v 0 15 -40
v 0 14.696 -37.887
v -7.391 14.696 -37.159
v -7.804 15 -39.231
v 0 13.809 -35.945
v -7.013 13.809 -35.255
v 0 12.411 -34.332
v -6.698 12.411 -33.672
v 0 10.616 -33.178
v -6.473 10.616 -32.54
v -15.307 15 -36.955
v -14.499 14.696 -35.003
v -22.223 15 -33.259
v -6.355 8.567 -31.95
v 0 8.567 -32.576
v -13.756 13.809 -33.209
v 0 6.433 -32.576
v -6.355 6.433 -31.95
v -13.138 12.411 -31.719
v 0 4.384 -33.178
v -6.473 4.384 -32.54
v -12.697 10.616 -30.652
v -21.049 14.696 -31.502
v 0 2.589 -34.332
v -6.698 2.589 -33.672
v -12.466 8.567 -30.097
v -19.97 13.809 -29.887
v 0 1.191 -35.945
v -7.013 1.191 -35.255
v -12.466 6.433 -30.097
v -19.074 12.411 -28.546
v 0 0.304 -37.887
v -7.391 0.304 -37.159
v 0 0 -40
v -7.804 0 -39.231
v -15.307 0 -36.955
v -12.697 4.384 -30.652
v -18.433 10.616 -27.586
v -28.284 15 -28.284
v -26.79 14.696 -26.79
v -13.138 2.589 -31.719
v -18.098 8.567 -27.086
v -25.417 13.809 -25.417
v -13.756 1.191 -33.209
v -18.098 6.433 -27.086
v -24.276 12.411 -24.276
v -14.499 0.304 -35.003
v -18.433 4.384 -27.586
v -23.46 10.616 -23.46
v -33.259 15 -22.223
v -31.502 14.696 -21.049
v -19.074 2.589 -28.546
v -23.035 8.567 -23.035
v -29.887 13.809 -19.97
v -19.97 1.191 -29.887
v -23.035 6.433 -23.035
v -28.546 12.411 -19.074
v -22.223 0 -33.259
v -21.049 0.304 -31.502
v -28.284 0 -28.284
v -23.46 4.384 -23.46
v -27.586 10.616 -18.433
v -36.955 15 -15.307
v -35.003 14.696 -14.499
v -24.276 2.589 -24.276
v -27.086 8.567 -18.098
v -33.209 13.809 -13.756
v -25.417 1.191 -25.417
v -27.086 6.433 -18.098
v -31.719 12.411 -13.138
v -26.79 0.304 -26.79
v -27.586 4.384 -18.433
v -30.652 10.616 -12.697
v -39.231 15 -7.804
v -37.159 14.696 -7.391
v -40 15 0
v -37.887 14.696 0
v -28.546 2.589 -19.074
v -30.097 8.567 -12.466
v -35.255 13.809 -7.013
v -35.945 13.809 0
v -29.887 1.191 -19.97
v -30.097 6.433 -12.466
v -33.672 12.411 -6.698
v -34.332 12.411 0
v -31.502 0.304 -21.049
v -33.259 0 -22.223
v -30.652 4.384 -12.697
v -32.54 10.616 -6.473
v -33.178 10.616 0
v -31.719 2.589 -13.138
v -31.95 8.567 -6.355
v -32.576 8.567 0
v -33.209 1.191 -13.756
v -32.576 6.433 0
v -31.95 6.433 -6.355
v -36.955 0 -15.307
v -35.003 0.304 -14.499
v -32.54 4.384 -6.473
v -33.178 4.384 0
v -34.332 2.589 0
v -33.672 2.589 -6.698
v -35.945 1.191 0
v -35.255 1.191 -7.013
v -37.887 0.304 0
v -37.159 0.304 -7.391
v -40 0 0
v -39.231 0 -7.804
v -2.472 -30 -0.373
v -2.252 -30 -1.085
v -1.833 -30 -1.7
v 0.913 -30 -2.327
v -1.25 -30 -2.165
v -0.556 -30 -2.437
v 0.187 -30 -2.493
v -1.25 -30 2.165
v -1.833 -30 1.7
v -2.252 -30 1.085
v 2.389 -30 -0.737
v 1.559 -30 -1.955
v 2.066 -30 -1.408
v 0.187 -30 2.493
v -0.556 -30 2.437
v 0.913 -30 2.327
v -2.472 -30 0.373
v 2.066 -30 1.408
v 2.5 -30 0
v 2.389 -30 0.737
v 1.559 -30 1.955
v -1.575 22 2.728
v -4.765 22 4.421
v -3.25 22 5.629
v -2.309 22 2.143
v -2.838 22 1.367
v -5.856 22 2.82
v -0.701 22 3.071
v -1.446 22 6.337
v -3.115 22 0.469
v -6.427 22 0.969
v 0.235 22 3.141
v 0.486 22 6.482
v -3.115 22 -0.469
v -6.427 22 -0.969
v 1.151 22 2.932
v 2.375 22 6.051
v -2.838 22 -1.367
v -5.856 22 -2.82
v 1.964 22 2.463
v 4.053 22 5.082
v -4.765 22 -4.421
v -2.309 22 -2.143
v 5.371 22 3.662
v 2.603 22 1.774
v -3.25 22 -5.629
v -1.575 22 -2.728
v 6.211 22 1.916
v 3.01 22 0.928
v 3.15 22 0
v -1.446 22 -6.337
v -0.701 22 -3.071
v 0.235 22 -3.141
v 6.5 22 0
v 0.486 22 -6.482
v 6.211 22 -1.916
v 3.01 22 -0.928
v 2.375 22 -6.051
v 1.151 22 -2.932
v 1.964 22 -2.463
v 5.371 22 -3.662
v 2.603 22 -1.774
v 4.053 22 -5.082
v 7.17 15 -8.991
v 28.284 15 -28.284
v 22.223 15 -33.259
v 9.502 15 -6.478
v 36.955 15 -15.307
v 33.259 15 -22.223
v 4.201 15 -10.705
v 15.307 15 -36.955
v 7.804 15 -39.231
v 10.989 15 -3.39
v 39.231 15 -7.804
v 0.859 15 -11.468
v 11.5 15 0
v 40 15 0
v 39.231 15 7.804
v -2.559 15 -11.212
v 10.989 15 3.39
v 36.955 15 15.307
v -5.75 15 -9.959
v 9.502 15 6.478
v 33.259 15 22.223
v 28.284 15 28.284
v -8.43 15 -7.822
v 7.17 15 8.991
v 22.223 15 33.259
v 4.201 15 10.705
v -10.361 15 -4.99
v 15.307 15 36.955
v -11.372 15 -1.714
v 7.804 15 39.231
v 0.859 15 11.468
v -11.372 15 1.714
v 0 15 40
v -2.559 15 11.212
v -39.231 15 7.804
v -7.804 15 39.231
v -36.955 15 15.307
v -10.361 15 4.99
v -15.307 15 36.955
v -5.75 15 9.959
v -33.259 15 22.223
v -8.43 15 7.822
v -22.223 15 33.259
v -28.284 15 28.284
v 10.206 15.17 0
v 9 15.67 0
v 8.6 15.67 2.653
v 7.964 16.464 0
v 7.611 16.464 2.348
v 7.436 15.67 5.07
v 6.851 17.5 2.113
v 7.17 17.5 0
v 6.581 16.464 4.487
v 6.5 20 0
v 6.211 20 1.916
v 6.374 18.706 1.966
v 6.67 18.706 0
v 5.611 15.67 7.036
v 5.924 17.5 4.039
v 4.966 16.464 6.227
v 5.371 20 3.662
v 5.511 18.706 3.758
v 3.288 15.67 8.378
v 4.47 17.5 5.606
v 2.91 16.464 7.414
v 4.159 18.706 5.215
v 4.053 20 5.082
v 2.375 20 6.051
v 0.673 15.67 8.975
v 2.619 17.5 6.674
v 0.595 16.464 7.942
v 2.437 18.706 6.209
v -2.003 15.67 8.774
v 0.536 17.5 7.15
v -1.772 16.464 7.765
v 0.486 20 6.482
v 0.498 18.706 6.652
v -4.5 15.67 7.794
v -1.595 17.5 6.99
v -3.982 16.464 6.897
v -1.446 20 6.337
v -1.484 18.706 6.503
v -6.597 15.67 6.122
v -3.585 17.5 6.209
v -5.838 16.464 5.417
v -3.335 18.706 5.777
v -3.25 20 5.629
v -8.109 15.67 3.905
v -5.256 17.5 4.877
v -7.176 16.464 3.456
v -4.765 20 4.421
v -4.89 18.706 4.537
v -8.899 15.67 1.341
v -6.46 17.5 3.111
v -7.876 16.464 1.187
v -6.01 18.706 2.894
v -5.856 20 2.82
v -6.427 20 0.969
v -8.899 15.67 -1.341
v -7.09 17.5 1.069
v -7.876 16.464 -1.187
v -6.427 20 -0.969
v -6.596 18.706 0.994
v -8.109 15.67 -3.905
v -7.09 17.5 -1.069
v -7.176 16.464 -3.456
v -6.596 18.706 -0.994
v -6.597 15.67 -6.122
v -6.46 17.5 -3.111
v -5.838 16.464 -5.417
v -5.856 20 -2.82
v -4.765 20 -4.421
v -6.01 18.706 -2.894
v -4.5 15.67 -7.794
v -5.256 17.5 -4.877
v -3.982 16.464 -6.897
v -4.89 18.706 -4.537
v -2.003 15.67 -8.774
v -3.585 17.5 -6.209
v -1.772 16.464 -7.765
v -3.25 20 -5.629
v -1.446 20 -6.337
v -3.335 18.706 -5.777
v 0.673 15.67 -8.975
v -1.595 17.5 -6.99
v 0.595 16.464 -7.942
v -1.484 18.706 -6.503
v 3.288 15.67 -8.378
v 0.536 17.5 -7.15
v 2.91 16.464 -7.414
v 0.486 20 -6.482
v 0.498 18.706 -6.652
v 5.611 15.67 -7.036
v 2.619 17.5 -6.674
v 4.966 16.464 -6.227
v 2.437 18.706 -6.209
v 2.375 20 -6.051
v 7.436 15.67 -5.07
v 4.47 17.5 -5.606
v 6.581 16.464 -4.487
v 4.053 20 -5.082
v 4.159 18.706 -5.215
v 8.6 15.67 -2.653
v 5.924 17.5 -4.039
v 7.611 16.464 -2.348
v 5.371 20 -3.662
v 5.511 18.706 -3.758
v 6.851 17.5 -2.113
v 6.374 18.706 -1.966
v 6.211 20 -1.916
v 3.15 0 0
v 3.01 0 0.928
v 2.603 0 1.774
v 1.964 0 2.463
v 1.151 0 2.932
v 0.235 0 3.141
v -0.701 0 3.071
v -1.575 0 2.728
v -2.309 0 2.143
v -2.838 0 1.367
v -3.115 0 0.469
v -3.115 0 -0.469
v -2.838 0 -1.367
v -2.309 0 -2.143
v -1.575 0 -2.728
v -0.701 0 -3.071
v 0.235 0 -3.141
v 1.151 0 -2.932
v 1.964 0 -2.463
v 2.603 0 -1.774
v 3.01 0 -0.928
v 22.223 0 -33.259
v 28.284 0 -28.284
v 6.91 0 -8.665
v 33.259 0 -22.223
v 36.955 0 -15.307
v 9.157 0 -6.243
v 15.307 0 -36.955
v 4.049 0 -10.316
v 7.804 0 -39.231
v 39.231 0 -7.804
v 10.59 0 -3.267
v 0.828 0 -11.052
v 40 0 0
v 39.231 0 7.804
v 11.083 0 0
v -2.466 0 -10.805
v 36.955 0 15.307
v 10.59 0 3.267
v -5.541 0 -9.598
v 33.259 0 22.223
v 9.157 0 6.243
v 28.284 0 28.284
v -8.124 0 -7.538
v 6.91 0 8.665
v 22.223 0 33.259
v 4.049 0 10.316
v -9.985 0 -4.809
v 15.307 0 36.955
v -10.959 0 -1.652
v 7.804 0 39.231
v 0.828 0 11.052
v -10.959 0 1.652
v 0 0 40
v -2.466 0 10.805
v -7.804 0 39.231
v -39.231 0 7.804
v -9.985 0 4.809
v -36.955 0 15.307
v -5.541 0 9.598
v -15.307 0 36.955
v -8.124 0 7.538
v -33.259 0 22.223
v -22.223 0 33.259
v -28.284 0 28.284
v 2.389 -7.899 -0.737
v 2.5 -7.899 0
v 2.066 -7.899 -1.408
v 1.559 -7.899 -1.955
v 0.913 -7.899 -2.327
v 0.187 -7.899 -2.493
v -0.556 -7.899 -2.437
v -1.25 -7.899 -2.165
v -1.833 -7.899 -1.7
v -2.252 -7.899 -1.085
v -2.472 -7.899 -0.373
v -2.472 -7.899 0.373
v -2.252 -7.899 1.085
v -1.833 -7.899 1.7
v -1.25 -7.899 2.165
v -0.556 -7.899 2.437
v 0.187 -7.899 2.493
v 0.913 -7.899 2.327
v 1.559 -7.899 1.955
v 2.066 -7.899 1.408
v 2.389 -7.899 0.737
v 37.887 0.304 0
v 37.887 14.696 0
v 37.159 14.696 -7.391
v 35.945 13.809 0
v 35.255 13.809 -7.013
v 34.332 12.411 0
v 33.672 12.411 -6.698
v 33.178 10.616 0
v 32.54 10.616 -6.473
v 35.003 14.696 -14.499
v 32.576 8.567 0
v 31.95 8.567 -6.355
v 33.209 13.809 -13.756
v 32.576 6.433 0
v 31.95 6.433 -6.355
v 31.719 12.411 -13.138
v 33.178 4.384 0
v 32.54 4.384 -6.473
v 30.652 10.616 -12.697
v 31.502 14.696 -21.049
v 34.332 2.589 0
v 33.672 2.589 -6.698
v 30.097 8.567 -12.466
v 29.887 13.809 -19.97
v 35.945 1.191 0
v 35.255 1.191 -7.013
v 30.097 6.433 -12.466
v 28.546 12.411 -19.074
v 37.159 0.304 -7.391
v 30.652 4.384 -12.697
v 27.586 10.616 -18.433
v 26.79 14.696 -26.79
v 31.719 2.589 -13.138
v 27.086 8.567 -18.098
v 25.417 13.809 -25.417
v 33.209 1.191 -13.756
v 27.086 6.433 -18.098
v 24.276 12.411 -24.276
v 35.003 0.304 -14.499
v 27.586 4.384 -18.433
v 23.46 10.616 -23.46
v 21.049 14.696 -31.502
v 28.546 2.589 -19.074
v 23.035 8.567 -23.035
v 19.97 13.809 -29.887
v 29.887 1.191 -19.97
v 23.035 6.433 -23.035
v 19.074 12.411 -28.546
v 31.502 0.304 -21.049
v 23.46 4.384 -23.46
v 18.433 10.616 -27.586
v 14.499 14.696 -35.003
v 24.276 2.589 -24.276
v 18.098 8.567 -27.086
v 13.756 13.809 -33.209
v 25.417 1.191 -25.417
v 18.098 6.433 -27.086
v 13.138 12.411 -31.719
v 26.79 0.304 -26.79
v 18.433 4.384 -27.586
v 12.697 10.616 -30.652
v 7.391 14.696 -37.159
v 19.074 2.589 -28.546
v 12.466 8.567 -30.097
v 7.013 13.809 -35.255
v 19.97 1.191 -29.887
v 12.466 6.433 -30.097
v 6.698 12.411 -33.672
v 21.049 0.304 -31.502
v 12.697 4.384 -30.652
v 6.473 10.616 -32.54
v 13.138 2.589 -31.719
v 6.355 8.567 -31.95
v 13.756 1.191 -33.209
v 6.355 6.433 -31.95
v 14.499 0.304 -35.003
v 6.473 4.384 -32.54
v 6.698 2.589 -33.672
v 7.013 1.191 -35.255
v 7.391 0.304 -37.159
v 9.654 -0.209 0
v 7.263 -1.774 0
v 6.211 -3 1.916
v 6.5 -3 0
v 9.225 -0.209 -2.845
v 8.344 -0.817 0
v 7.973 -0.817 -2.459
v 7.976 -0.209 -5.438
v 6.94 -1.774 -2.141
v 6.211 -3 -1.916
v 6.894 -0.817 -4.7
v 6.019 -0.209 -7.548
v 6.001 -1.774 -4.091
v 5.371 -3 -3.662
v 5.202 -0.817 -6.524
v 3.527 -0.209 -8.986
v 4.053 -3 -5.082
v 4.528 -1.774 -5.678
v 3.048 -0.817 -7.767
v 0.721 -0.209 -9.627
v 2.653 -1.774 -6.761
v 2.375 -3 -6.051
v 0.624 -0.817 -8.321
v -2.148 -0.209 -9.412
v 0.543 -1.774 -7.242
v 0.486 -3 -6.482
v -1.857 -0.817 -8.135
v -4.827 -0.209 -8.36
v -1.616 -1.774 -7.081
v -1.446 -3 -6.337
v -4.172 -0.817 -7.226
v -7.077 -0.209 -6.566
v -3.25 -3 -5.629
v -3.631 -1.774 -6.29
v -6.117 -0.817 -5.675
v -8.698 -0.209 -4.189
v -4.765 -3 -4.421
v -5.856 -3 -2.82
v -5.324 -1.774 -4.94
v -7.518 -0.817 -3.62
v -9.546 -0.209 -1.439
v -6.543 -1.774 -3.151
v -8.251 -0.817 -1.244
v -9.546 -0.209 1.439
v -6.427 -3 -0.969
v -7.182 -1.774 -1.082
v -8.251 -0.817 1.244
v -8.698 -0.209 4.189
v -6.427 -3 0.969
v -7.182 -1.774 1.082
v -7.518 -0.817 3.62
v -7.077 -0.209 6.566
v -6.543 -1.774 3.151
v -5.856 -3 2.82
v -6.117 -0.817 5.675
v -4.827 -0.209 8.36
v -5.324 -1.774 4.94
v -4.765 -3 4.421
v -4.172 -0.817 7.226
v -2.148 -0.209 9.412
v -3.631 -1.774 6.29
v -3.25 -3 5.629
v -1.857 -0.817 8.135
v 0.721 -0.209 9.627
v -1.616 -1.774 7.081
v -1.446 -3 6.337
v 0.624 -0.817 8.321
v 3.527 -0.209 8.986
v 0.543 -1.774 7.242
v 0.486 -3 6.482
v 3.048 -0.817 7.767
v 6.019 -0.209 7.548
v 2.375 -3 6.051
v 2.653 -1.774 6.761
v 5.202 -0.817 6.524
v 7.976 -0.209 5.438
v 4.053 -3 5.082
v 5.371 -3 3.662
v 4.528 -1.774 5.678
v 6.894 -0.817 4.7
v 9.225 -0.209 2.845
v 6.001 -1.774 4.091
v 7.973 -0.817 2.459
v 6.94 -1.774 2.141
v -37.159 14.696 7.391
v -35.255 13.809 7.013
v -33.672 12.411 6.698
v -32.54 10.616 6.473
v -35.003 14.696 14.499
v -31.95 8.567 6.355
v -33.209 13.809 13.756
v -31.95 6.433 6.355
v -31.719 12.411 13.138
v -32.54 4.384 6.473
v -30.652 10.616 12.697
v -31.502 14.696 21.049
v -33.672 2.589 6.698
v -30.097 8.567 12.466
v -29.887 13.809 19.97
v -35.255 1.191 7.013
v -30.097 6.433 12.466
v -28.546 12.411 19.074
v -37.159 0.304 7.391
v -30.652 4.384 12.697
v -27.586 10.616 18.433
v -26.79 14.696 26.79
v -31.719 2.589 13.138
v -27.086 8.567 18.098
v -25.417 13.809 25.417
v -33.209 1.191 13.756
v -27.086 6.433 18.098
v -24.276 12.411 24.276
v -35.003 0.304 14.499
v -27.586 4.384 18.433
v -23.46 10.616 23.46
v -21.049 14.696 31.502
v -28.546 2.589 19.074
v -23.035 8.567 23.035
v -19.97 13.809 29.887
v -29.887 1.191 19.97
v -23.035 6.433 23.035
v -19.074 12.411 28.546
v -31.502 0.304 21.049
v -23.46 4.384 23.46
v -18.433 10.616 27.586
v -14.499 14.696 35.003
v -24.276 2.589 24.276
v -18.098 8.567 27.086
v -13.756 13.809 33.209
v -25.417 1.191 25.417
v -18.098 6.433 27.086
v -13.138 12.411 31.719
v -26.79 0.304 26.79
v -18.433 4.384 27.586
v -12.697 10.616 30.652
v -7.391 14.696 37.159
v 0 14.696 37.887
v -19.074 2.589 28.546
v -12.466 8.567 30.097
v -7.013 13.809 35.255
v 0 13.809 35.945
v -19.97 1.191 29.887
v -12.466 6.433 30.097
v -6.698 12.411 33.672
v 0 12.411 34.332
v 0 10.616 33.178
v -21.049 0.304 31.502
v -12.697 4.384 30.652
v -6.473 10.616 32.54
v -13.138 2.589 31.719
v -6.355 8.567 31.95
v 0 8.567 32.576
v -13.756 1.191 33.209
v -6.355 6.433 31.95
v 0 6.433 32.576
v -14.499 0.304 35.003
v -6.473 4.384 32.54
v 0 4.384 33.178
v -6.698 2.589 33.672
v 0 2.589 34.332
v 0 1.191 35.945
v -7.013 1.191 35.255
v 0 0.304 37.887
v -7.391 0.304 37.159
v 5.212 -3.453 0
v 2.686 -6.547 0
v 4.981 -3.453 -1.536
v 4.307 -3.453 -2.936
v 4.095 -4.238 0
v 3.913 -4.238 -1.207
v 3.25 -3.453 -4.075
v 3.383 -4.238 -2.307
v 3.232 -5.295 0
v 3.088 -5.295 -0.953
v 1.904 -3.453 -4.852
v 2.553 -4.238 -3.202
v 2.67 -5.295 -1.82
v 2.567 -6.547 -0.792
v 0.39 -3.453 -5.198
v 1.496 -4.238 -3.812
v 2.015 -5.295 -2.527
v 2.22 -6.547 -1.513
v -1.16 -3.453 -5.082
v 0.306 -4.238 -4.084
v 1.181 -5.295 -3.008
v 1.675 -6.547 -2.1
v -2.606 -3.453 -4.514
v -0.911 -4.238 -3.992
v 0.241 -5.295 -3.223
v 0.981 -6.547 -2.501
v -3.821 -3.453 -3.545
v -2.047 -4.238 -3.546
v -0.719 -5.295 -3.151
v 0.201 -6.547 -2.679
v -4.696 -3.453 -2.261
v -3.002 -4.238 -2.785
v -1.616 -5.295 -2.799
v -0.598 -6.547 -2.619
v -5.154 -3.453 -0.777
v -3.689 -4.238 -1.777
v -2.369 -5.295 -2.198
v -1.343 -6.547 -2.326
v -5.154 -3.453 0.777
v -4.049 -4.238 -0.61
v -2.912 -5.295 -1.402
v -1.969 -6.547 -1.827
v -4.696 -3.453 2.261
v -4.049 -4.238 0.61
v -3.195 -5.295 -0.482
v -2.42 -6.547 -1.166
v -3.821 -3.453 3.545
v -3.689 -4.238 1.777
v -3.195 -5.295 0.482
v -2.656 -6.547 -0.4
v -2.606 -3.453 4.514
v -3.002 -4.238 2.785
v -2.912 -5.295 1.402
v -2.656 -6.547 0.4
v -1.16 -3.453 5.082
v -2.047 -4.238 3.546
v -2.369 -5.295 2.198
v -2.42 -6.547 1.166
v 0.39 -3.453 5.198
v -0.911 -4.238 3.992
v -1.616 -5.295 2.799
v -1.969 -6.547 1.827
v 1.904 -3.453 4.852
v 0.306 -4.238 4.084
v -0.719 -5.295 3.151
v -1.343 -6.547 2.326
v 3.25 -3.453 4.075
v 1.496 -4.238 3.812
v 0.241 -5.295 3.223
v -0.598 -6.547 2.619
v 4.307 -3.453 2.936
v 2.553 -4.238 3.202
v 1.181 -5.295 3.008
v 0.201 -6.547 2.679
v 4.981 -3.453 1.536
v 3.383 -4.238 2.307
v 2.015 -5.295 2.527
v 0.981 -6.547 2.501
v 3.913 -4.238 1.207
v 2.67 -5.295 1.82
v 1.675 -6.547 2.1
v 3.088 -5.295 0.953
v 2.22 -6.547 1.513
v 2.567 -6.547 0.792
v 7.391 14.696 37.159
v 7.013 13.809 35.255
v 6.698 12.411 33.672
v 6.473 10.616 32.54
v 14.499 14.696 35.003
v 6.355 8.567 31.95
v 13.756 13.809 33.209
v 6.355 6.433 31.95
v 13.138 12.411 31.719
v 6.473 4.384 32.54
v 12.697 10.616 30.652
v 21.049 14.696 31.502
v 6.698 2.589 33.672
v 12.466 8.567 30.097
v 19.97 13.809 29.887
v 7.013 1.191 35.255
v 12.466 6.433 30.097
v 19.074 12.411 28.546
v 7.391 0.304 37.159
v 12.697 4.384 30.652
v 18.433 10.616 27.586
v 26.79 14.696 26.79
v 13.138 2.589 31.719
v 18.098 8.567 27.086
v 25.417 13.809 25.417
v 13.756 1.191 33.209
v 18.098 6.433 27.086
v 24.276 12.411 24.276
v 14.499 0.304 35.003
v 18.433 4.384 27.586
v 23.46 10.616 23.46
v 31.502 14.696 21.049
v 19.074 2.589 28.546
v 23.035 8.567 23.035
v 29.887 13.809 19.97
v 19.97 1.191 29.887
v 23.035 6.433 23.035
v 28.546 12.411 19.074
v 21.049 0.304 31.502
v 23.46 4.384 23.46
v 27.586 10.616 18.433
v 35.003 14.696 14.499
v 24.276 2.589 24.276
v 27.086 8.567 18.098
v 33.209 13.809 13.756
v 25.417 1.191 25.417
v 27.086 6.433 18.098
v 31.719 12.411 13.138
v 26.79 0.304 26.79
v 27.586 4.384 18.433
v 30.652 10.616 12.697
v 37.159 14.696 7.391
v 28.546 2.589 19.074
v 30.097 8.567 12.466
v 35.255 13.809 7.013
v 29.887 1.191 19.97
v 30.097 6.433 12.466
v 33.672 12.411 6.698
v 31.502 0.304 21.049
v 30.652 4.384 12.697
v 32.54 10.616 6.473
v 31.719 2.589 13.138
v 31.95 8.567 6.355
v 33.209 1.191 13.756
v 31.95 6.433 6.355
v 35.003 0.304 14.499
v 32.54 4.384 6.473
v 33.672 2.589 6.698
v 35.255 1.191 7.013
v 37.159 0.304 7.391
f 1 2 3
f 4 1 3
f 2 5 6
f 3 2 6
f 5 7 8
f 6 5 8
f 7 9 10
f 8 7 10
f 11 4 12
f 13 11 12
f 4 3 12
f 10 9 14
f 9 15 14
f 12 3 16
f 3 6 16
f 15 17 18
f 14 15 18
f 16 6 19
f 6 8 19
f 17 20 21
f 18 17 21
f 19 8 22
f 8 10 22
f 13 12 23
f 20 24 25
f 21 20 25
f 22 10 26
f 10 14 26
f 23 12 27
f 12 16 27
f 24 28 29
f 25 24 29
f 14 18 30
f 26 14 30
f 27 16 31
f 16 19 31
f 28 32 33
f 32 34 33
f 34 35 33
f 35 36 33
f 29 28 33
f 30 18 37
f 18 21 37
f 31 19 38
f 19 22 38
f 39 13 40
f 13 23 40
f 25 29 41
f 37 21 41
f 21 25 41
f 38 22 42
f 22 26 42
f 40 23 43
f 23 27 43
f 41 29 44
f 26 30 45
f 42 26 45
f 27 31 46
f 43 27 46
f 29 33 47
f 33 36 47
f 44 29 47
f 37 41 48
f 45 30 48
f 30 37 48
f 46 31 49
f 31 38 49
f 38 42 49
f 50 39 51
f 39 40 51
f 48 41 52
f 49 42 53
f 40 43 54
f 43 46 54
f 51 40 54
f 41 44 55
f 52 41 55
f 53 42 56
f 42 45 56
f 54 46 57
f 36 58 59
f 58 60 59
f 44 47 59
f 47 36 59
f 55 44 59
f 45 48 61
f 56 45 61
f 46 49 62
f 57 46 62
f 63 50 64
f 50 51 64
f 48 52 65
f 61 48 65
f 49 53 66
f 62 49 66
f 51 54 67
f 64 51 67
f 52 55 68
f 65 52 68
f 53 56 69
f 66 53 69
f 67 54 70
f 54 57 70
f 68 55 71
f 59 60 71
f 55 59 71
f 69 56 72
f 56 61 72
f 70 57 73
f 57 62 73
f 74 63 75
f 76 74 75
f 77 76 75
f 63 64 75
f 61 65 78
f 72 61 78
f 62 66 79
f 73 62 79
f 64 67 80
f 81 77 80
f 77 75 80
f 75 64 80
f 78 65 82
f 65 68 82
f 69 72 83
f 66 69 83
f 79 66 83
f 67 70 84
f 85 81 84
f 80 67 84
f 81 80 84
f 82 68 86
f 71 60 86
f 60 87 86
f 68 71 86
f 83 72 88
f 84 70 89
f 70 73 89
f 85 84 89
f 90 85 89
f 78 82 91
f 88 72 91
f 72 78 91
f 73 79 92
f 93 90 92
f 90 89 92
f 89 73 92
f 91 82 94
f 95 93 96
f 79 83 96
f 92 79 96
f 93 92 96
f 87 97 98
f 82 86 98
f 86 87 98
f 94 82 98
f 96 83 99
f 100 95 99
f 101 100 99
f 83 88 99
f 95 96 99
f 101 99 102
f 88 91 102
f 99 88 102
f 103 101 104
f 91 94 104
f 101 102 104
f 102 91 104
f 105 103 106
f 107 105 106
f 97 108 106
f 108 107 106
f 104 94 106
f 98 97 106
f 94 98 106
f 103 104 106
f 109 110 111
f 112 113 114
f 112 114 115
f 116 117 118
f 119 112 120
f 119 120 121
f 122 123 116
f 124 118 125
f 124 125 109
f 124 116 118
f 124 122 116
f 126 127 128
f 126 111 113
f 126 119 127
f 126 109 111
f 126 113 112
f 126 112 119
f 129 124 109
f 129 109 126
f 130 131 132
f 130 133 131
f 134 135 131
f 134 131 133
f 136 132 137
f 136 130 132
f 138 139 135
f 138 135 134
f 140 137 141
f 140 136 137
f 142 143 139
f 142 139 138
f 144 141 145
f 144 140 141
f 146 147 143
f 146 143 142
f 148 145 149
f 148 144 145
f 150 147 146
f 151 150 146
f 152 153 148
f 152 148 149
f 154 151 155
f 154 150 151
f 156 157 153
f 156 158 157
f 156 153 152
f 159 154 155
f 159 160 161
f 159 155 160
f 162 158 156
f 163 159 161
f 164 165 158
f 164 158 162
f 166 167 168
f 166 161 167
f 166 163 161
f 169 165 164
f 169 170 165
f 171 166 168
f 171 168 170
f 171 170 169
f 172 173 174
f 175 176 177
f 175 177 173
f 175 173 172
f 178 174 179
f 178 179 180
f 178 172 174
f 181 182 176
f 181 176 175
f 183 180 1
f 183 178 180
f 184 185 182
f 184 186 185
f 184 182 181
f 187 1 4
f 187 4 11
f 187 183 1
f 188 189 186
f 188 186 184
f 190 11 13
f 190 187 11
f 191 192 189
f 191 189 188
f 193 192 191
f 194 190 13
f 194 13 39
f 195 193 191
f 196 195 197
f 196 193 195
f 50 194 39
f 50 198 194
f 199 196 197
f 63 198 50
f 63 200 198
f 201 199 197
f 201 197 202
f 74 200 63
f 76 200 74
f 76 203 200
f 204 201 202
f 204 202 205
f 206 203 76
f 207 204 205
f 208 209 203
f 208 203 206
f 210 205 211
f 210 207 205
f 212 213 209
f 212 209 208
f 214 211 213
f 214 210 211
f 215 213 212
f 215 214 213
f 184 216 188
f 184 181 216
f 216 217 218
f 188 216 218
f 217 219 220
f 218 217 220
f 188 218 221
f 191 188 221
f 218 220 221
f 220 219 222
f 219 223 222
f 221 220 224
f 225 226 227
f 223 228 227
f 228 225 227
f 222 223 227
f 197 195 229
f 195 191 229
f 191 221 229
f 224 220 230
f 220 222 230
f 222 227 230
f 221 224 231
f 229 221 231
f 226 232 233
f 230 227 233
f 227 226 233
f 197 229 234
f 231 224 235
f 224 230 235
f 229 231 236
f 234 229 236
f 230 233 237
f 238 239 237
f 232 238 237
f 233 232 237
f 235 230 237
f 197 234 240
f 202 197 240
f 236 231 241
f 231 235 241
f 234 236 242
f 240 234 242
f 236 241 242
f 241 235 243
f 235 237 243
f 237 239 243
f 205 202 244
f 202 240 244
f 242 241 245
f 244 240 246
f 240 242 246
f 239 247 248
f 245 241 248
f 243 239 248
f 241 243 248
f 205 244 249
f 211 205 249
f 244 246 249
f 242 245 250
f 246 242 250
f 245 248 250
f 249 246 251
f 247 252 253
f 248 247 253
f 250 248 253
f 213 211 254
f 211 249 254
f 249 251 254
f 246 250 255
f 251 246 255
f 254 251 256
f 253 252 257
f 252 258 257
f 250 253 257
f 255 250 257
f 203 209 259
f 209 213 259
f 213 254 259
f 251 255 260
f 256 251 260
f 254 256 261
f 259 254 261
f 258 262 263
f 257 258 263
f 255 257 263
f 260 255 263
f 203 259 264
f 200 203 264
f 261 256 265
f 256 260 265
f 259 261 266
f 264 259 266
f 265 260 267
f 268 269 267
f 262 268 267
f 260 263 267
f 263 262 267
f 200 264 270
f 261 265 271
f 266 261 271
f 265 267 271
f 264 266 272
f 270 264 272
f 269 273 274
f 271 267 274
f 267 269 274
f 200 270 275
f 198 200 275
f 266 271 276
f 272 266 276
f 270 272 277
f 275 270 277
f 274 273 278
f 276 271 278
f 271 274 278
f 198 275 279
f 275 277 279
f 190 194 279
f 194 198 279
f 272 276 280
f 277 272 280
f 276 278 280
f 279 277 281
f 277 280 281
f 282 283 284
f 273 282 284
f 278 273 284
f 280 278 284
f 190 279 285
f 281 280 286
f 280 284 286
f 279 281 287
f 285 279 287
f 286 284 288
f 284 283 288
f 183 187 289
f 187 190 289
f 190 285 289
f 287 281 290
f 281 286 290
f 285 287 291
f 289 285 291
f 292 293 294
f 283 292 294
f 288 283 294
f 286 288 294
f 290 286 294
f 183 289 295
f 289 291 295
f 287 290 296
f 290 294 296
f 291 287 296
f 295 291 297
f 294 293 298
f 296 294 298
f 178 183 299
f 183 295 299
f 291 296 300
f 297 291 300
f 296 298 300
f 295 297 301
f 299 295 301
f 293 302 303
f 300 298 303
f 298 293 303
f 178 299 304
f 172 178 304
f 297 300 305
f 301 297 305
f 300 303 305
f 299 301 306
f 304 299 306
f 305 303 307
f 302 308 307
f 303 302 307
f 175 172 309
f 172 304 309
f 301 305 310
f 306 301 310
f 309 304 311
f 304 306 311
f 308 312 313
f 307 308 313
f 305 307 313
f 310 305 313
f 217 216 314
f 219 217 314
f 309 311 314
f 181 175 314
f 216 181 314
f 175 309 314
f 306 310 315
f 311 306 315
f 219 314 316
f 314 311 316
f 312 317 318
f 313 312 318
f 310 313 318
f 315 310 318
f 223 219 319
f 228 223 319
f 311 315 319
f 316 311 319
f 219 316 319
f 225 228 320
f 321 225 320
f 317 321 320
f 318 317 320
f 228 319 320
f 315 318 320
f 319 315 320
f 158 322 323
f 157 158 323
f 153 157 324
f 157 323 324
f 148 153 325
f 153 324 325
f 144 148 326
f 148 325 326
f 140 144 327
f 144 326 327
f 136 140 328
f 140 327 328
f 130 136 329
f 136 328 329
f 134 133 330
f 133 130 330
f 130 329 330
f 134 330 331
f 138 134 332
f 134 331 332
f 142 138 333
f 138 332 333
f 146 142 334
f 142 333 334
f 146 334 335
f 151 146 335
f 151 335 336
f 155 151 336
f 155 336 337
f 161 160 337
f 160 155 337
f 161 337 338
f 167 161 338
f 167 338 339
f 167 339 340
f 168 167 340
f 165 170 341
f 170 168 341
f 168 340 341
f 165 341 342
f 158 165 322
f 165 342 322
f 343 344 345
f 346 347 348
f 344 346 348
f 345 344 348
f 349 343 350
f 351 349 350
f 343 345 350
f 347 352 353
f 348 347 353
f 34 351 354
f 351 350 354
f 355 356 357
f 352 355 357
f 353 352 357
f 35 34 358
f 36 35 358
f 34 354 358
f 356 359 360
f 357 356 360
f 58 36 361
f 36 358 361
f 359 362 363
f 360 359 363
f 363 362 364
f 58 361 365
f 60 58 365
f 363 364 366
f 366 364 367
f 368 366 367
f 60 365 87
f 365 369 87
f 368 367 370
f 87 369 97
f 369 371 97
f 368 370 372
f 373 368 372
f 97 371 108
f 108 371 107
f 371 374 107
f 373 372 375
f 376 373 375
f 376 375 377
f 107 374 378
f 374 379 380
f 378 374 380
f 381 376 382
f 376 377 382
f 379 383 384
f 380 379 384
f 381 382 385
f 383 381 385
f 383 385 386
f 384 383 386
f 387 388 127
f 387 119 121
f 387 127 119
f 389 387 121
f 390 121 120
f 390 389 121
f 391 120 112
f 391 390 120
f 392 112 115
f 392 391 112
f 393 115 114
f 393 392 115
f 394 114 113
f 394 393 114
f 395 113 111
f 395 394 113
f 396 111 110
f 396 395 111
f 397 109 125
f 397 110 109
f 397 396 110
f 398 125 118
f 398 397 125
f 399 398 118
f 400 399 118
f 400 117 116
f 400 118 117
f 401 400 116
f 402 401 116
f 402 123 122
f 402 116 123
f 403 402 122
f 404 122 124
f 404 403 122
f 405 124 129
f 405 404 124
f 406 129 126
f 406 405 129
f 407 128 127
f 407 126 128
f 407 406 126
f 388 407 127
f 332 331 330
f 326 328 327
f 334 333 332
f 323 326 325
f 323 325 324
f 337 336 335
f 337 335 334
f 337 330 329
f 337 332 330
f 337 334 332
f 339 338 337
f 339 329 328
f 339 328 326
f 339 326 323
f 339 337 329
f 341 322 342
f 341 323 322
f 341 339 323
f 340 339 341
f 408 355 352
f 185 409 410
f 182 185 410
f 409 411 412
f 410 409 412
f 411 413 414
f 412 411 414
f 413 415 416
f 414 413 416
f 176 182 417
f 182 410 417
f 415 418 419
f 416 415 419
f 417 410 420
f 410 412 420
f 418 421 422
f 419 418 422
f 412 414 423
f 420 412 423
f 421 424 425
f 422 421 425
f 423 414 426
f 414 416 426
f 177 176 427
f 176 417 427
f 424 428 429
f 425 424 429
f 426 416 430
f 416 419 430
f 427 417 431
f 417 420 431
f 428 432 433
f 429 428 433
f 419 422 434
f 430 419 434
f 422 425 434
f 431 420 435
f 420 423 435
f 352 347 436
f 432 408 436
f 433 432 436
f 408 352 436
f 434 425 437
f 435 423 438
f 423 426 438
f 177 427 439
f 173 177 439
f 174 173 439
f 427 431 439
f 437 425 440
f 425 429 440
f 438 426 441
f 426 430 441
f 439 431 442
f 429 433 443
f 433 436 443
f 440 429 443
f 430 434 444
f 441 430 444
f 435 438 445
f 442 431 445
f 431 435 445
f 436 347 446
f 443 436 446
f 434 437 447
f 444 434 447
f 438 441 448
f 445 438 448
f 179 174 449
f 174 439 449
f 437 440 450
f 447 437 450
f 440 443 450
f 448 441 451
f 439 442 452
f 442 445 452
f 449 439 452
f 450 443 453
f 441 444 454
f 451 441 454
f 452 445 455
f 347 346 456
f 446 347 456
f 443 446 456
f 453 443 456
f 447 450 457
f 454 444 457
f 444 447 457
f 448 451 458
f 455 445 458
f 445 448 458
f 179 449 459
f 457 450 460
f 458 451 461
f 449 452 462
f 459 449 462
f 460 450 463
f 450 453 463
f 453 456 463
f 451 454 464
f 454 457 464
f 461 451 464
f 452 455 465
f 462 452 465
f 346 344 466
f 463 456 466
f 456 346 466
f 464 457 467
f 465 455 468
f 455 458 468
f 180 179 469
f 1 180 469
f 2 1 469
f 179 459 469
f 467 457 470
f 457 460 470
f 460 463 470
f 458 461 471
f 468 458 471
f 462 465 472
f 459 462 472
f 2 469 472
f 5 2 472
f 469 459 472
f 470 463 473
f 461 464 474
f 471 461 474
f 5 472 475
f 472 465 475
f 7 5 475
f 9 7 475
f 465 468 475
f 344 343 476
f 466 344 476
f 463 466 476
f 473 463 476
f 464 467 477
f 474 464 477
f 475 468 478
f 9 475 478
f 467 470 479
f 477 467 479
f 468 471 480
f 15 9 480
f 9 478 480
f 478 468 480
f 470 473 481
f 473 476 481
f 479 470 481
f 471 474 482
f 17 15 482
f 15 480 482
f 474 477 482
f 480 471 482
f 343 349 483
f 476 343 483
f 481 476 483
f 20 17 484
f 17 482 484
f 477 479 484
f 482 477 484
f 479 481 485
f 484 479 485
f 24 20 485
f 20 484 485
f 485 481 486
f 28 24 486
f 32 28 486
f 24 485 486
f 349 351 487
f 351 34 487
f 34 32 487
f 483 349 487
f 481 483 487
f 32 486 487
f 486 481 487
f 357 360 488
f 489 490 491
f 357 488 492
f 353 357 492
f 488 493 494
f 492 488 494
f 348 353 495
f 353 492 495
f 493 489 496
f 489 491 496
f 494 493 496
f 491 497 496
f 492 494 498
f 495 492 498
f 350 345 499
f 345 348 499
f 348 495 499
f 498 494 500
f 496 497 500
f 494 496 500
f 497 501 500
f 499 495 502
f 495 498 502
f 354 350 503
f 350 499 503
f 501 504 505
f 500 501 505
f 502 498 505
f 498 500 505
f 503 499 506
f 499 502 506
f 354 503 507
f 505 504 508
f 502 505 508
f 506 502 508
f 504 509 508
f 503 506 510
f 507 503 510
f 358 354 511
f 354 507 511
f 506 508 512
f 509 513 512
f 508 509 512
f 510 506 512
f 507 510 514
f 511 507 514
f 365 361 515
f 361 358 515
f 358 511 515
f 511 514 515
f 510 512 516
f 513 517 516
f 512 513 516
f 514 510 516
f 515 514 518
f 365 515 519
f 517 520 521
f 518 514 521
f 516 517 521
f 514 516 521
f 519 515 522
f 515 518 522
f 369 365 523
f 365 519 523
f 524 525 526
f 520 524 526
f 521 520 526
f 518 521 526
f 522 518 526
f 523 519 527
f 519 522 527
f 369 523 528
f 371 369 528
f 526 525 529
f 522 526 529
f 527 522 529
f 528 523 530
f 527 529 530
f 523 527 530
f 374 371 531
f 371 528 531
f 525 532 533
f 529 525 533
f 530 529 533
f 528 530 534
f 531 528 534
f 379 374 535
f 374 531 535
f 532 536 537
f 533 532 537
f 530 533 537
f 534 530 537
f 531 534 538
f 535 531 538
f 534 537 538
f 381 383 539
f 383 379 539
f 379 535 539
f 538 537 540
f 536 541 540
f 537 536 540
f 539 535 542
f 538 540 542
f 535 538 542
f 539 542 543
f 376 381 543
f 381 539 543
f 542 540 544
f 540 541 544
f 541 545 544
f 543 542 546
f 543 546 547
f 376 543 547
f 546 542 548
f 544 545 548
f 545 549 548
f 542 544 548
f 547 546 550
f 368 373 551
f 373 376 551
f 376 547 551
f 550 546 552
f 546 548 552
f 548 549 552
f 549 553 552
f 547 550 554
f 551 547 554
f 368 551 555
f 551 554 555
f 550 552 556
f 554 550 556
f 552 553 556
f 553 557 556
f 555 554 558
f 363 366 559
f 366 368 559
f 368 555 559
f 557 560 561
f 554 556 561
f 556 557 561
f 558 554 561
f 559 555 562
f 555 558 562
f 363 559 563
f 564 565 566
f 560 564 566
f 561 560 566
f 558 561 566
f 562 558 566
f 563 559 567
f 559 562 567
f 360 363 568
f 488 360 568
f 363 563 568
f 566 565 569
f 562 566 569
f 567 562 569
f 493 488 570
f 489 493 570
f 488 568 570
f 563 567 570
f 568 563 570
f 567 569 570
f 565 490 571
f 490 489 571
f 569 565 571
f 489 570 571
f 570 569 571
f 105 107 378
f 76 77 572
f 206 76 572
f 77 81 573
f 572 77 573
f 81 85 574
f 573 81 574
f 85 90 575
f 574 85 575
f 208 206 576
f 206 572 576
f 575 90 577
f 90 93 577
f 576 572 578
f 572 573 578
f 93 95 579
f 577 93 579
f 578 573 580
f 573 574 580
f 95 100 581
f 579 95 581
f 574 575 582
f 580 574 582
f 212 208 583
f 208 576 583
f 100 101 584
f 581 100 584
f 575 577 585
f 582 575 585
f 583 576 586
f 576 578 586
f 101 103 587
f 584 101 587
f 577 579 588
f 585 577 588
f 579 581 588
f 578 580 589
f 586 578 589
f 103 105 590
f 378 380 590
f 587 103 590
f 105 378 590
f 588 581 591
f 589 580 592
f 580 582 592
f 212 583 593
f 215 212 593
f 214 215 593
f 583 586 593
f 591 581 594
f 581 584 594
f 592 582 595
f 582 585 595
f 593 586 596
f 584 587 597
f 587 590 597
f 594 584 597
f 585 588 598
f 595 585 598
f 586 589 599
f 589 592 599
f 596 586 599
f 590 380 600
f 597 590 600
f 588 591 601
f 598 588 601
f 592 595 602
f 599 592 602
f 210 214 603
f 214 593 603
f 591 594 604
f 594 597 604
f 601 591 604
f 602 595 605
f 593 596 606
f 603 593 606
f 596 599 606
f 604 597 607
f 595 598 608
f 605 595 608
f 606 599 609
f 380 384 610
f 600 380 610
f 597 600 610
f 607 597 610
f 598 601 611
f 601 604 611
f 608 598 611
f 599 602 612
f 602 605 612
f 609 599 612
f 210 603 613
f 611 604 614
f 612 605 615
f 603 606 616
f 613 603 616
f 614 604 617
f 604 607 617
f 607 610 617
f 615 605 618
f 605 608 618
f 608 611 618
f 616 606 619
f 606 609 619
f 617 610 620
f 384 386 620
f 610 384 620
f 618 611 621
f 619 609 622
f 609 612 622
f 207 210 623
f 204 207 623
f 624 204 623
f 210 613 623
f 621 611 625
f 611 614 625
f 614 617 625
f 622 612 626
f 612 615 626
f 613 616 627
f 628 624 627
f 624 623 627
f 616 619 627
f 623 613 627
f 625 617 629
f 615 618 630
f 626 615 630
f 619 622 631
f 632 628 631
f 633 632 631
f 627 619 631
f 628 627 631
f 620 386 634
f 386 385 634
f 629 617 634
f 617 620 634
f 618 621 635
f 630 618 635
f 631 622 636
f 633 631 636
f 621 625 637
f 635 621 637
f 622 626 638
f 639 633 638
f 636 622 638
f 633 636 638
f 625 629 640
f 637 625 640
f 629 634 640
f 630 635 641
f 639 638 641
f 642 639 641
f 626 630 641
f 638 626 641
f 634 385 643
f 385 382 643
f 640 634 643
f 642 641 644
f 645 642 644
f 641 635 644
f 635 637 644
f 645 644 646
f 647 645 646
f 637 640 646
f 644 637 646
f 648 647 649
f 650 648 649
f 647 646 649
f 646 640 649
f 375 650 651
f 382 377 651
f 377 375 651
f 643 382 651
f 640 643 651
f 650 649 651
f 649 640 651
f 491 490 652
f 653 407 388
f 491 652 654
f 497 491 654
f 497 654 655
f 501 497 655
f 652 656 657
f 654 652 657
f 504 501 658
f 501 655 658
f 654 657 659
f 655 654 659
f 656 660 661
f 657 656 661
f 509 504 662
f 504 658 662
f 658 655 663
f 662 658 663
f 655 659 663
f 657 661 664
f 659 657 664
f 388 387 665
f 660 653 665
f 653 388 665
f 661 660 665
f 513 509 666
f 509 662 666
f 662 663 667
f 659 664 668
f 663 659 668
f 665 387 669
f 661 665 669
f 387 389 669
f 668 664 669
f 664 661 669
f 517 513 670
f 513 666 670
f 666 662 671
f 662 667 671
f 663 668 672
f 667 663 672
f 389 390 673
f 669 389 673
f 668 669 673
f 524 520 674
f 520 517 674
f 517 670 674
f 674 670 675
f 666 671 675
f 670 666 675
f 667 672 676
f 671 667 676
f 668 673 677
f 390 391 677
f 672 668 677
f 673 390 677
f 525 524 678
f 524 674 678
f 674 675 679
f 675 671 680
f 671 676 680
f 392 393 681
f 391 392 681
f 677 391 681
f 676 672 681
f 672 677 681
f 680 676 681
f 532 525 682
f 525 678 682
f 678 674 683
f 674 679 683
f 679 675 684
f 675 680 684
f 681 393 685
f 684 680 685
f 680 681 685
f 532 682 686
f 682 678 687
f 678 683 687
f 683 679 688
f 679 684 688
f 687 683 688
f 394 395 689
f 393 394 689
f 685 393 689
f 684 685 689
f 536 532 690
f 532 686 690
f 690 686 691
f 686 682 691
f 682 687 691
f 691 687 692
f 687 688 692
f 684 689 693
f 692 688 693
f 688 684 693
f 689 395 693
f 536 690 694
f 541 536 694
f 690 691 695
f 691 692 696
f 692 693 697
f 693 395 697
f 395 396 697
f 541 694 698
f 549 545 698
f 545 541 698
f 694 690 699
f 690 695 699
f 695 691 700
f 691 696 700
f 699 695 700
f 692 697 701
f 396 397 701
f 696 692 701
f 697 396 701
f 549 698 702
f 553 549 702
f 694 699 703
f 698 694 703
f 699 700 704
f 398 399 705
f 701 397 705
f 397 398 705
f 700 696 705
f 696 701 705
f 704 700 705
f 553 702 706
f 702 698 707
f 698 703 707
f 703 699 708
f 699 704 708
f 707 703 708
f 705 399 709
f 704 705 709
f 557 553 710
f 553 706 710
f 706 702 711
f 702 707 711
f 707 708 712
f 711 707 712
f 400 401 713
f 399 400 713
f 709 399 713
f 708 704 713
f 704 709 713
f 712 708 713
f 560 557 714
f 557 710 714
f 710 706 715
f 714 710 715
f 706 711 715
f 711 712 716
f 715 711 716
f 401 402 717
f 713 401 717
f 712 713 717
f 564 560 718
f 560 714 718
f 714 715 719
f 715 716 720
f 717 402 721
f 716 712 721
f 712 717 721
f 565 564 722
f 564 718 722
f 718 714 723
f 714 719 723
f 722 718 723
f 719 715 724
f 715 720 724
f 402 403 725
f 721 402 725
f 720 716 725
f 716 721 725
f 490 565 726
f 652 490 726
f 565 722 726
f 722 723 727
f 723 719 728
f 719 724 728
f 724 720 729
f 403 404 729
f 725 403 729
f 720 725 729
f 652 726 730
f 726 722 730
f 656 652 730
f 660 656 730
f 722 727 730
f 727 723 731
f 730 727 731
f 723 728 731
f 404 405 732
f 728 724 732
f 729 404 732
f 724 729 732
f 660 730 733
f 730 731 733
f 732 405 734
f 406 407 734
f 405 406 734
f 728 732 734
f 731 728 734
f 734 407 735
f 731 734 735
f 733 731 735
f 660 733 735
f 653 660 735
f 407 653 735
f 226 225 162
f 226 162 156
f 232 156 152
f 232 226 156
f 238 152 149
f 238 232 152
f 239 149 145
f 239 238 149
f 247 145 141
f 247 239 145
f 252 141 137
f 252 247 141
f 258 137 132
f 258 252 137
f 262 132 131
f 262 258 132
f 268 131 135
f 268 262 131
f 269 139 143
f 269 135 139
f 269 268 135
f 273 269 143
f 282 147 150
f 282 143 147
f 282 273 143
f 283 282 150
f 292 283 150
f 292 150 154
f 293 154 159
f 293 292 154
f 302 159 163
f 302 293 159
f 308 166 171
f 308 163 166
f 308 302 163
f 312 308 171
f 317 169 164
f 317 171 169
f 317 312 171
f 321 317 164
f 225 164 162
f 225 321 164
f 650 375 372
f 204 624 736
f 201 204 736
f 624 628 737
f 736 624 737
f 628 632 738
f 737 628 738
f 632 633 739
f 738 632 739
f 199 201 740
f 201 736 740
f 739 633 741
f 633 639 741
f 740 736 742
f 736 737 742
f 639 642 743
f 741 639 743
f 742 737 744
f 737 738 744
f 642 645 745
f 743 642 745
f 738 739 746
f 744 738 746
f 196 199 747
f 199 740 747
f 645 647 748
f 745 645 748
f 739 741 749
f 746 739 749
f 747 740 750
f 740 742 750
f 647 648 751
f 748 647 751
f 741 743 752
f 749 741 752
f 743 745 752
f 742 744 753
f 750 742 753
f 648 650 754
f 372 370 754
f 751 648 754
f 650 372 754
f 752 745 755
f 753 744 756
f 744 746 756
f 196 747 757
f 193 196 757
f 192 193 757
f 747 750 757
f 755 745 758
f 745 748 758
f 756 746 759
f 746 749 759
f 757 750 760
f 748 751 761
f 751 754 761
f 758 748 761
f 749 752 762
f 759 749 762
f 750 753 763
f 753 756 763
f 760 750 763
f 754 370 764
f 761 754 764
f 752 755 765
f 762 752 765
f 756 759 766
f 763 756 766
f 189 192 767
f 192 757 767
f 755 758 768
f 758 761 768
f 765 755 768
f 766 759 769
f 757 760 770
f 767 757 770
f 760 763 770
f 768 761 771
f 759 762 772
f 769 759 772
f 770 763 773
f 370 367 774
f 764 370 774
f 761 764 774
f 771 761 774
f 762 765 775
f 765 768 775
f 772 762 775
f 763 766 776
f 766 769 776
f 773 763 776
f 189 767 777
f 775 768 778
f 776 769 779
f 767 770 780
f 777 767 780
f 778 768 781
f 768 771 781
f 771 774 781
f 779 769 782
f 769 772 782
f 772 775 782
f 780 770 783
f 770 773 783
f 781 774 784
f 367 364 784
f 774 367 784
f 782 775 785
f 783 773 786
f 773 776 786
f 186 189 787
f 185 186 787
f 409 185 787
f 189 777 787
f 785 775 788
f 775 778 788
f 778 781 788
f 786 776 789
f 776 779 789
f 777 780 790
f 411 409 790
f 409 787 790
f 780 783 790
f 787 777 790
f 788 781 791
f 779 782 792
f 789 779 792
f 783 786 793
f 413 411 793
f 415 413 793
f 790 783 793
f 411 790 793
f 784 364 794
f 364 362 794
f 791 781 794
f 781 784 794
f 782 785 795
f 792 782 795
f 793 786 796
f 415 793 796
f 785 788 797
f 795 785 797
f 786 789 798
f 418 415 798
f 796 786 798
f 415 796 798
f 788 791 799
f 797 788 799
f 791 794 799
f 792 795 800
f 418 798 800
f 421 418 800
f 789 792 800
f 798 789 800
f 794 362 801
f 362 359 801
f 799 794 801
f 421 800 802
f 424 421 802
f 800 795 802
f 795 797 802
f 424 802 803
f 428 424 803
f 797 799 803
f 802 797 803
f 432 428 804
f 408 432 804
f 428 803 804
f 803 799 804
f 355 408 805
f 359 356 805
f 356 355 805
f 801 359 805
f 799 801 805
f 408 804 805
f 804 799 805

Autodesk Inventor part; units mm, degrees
ref_plane "YZ Plane" through (0, 0, 0) normal (1, 0, 0) x (0, 1, 0)
ref_plane "XZ Plane" through (0, 0, 0) normal (0, 1, 0) x (-1, 0, 0)
ref_plane "XY Plane" through (0, 0, 0) normal (0, 0, 1) x (1, 0, 0)
sketch "Sketch1" plane through (0, 0, 0) normal (0, 1, 0) x (-1, 0, 0)
  circle A0 centre (0, 0) radius 40
  dimension "d0" = 80
extrude "Extrusion1" add sketch "Sketch1" along normal blind 15
sketch "Sketch2" plane through (0, 0, 0) normal (1, 0, 0) x (0, 1, 0)
  line L0 (0, 40) -> (15, 40) projected
  line L1 (15, -40) -> (15, 40) projected
  circle A0 centre (7.5, 40) radius 7.5
  point P0 (0, 0)
sketch3d "3D Sketch1"
  arc A0 (-40, 15, 0) -> (0, 15, 40) centre (0, 15, 0) ccw
  arc A1 (0, 15, 40) -> (40, 15, 0) centre (0, 15, 0) ccw
  arc A2 (40, 15, 0) -> (0, 15, -40) centre (0, 15, 0) ccw
  arc A3 (0, 15, -40) -> (-40, 15, 0) centre (0, 15, 0) ccw
sweep "Sweep1" cut profiles "Sketch2" path "3D Sketch1" picked at (7.8013, 37.5182) contours L0 A0
sketch "Sketch3" plane through (0, 15, 0) normal (0, 1, 0) x (1, 0, 0)
  circle A0 centre (0, 0) radius 3.15
  circle A1 centre (0, 0) radius 6.5
  dimension "d5" = 6.3
  dimension "d6" = 13
extrude "Extrusion2" add sketch "Sketch3" along normal blind 7
sketch "Sketch4" plane through (0, 0, 0) normal (0, -1, 0) x (1, 0, 0)
  circle A0 centre (0, 0) radius 3.15 projected
  circle A1 centre (0, 0) radius 6.5
  dimension "d9" = 13
extrude "Extrusion3" add sketch "Sketch4" along normal blind 3 contours A0 | A1
sketch "Sketch5" plane through (0, 15, 0) normal (0, 1, 0) x (1, 0, 0)
  circle A0 centre (0, 0) radius 3.15 projected
  circle A1 centre (0, 0) radius 3.15
  dimension "d12" = 6.3
extrude "Extrusion4" cut sketch "Sketch5" against normal blind 15
sketch "Sketch6" plane through (0, -3, 0) normal (0, -1, 0) x (1, 0, 0)
  circle A0 centre (0, 0) radius 3.15 projected
  circle A1 centre (0, 0) radius 2.5
  dimension "d15" = 5
extrude "Extrusion5" add sketch "Sketch6" along normal blind 27 contours A1
fillet "Fillet1" radius 5 1 edges at (-2.5, -3, 0)
fillet "Fillet2" radius 5 1 edges at (-6.5, 0, 0)
fillet "Fillet3" radius 5 1 edges at (-6.5, 15, 0)
properties part number "pulley"
